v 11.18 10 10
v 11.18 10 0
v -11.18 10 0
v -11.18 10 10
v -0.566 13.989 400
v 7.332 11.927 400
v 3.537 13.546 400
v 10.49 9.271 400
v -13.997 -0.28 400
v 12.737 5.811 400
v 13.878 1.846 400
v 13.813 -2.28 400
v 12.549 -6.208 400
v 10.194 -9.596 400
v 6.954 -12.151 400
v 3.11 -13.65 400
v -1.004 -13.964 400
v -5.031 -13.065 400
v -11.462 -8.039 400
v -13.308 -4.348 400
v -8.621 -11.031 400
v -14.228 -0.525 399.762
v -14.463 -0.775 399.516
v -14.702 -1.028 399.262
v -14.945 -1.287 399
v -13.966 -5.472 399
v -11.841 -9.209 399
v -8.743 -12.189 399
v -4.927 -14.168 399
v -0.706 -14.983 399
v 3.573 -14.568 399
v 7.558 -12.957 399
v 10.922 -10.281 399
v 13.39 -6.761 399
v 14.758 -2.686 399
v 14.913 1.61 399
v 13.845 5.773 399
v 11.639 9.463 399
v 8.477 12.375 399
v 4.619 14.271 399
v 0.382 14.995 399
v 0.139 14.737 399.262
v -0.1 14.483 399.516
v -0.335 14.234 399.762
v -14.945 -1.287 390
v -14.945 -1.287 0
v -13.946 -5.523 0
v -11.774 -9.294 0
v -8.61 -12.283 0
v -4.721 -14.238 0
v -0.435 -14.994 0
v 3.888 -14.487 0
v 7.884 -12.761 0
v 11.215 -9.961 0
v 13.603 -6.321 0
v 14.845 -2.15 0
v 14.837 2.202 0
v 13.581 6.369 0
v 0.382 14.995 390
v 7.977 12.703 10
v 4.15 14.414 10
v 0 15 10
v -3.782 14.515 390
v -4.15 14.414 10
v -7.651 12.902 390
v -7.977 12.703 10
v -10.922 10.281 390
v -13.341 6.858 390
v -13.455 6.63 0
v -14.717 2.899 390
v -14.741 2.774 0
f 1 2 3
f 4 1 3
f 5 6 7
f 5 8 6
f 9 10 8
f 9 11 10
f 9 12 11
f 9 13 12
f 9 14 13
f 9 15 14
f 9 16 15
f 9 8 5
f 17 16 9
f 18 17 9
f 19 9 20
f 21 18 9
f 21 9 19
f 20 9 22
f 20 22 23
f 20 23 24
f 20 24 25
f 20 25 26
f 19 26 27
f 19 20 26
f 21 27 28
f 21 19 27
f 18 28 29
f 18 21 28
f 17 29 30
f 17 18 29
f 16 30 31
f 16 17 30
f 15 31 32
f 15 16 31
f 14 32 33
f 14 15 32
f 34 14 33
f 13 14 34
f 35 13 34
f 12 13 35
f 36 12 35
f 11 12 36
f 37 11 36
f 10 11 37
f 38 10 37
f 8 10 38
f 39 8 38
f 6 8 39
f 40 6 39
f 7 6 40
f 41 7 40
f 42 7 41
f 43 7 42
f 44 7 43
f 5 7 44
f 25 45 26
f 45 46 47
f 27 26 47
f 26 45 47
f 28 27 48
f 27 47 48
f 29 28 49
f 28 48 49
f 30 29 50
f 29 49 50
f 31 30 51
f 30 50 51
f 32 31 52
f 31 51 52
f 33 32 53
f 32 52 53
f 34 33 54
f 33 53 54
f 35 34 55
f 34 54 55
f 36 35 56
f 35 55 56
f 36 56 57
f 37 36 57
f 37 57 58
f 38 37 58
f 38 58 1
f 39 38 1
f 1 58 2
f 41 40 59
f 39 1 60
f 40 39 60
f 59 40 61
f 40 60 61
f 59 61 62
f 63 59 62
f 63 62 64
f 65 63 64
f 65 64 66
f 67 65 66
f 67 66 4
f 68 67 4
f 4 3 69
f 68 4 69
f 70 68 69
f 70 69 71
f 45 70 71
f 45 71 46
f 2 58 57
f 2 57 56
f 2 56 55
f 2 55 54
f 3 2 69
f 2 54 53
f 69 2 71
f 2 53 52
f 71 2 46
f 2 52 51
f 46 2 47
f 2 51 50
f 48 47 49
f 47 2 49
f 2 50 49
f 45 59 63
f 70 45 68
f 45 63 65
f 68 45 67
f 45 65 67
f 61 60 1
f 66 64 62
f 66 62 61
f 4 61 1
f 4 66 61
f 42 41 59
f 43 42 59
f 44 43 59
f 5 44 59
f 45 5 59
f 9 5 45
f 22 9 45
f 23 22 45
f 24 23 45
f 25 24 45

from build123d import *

# Parameters (mm, degrees)
ESQUISSE1_R             = 15
BASE_EXTRUSION_DEPTH    = 400
CHANFREIN1_SIZE         = 1
ENL_V_MAT_EXTRU_1_DEPTH = 10
ESQUISSE3_W             = 50
ESQUISSE3_H             = 10
ENL_V_MAT_EXTRU_2_DEPTH = 10


with BuildPart() as part:
    # Esquisse1 → Base-Extrusion (new body)
    with BuildSketch(Plane.XY):
        with Locations(Location((0, 0, 0), (0, 0, 184.920671017))):
            Circle(ESQUISSE1_R)
    extrude(amount=BASE_EXTRUSION_DEPTH)

    # Chanfrein1
    chanfrein1_edges = [part.edges().sort_by_distance(p)[0] for p in [
        (14.944716223, 1.286645645, 400),
    ]]
    chamfer(chanfrein1_edges, length=CHANFREIN1_SIZE)

    # Esquisse2 → Enlèv. mat.-Extru.1 (cut)
    with BuildSketch(Plane.XY.offset(400)):
        Polygon((17.08733053, 32.74178837), (-26.801262557, -13.882147509), (-38.674413155, -3.843373525), (5.782041814, 43.38381605), align=None)
    extrude(amount=-ENL_V_MAT_EXTRU_1_DEPTH, mode=Mode.SUBTRACT)

    # Esquisse3 → Enlèv. mat.-Extru.2 (cut)
    with BuildSketch(Plane(origin=(0, 0, 0), x_dir=(-1, 0, 0), z_dir=(0, 0, -1))):
        with Locations((5, 15)):
            Rectangle(ESQUISSE3_W, ESQUISSE3_H)
    extrude(amount=-ENL_V_MAT_EXTRU_2_DEPTH, mode=Mode.SUBTRACT)


solid = part.part
